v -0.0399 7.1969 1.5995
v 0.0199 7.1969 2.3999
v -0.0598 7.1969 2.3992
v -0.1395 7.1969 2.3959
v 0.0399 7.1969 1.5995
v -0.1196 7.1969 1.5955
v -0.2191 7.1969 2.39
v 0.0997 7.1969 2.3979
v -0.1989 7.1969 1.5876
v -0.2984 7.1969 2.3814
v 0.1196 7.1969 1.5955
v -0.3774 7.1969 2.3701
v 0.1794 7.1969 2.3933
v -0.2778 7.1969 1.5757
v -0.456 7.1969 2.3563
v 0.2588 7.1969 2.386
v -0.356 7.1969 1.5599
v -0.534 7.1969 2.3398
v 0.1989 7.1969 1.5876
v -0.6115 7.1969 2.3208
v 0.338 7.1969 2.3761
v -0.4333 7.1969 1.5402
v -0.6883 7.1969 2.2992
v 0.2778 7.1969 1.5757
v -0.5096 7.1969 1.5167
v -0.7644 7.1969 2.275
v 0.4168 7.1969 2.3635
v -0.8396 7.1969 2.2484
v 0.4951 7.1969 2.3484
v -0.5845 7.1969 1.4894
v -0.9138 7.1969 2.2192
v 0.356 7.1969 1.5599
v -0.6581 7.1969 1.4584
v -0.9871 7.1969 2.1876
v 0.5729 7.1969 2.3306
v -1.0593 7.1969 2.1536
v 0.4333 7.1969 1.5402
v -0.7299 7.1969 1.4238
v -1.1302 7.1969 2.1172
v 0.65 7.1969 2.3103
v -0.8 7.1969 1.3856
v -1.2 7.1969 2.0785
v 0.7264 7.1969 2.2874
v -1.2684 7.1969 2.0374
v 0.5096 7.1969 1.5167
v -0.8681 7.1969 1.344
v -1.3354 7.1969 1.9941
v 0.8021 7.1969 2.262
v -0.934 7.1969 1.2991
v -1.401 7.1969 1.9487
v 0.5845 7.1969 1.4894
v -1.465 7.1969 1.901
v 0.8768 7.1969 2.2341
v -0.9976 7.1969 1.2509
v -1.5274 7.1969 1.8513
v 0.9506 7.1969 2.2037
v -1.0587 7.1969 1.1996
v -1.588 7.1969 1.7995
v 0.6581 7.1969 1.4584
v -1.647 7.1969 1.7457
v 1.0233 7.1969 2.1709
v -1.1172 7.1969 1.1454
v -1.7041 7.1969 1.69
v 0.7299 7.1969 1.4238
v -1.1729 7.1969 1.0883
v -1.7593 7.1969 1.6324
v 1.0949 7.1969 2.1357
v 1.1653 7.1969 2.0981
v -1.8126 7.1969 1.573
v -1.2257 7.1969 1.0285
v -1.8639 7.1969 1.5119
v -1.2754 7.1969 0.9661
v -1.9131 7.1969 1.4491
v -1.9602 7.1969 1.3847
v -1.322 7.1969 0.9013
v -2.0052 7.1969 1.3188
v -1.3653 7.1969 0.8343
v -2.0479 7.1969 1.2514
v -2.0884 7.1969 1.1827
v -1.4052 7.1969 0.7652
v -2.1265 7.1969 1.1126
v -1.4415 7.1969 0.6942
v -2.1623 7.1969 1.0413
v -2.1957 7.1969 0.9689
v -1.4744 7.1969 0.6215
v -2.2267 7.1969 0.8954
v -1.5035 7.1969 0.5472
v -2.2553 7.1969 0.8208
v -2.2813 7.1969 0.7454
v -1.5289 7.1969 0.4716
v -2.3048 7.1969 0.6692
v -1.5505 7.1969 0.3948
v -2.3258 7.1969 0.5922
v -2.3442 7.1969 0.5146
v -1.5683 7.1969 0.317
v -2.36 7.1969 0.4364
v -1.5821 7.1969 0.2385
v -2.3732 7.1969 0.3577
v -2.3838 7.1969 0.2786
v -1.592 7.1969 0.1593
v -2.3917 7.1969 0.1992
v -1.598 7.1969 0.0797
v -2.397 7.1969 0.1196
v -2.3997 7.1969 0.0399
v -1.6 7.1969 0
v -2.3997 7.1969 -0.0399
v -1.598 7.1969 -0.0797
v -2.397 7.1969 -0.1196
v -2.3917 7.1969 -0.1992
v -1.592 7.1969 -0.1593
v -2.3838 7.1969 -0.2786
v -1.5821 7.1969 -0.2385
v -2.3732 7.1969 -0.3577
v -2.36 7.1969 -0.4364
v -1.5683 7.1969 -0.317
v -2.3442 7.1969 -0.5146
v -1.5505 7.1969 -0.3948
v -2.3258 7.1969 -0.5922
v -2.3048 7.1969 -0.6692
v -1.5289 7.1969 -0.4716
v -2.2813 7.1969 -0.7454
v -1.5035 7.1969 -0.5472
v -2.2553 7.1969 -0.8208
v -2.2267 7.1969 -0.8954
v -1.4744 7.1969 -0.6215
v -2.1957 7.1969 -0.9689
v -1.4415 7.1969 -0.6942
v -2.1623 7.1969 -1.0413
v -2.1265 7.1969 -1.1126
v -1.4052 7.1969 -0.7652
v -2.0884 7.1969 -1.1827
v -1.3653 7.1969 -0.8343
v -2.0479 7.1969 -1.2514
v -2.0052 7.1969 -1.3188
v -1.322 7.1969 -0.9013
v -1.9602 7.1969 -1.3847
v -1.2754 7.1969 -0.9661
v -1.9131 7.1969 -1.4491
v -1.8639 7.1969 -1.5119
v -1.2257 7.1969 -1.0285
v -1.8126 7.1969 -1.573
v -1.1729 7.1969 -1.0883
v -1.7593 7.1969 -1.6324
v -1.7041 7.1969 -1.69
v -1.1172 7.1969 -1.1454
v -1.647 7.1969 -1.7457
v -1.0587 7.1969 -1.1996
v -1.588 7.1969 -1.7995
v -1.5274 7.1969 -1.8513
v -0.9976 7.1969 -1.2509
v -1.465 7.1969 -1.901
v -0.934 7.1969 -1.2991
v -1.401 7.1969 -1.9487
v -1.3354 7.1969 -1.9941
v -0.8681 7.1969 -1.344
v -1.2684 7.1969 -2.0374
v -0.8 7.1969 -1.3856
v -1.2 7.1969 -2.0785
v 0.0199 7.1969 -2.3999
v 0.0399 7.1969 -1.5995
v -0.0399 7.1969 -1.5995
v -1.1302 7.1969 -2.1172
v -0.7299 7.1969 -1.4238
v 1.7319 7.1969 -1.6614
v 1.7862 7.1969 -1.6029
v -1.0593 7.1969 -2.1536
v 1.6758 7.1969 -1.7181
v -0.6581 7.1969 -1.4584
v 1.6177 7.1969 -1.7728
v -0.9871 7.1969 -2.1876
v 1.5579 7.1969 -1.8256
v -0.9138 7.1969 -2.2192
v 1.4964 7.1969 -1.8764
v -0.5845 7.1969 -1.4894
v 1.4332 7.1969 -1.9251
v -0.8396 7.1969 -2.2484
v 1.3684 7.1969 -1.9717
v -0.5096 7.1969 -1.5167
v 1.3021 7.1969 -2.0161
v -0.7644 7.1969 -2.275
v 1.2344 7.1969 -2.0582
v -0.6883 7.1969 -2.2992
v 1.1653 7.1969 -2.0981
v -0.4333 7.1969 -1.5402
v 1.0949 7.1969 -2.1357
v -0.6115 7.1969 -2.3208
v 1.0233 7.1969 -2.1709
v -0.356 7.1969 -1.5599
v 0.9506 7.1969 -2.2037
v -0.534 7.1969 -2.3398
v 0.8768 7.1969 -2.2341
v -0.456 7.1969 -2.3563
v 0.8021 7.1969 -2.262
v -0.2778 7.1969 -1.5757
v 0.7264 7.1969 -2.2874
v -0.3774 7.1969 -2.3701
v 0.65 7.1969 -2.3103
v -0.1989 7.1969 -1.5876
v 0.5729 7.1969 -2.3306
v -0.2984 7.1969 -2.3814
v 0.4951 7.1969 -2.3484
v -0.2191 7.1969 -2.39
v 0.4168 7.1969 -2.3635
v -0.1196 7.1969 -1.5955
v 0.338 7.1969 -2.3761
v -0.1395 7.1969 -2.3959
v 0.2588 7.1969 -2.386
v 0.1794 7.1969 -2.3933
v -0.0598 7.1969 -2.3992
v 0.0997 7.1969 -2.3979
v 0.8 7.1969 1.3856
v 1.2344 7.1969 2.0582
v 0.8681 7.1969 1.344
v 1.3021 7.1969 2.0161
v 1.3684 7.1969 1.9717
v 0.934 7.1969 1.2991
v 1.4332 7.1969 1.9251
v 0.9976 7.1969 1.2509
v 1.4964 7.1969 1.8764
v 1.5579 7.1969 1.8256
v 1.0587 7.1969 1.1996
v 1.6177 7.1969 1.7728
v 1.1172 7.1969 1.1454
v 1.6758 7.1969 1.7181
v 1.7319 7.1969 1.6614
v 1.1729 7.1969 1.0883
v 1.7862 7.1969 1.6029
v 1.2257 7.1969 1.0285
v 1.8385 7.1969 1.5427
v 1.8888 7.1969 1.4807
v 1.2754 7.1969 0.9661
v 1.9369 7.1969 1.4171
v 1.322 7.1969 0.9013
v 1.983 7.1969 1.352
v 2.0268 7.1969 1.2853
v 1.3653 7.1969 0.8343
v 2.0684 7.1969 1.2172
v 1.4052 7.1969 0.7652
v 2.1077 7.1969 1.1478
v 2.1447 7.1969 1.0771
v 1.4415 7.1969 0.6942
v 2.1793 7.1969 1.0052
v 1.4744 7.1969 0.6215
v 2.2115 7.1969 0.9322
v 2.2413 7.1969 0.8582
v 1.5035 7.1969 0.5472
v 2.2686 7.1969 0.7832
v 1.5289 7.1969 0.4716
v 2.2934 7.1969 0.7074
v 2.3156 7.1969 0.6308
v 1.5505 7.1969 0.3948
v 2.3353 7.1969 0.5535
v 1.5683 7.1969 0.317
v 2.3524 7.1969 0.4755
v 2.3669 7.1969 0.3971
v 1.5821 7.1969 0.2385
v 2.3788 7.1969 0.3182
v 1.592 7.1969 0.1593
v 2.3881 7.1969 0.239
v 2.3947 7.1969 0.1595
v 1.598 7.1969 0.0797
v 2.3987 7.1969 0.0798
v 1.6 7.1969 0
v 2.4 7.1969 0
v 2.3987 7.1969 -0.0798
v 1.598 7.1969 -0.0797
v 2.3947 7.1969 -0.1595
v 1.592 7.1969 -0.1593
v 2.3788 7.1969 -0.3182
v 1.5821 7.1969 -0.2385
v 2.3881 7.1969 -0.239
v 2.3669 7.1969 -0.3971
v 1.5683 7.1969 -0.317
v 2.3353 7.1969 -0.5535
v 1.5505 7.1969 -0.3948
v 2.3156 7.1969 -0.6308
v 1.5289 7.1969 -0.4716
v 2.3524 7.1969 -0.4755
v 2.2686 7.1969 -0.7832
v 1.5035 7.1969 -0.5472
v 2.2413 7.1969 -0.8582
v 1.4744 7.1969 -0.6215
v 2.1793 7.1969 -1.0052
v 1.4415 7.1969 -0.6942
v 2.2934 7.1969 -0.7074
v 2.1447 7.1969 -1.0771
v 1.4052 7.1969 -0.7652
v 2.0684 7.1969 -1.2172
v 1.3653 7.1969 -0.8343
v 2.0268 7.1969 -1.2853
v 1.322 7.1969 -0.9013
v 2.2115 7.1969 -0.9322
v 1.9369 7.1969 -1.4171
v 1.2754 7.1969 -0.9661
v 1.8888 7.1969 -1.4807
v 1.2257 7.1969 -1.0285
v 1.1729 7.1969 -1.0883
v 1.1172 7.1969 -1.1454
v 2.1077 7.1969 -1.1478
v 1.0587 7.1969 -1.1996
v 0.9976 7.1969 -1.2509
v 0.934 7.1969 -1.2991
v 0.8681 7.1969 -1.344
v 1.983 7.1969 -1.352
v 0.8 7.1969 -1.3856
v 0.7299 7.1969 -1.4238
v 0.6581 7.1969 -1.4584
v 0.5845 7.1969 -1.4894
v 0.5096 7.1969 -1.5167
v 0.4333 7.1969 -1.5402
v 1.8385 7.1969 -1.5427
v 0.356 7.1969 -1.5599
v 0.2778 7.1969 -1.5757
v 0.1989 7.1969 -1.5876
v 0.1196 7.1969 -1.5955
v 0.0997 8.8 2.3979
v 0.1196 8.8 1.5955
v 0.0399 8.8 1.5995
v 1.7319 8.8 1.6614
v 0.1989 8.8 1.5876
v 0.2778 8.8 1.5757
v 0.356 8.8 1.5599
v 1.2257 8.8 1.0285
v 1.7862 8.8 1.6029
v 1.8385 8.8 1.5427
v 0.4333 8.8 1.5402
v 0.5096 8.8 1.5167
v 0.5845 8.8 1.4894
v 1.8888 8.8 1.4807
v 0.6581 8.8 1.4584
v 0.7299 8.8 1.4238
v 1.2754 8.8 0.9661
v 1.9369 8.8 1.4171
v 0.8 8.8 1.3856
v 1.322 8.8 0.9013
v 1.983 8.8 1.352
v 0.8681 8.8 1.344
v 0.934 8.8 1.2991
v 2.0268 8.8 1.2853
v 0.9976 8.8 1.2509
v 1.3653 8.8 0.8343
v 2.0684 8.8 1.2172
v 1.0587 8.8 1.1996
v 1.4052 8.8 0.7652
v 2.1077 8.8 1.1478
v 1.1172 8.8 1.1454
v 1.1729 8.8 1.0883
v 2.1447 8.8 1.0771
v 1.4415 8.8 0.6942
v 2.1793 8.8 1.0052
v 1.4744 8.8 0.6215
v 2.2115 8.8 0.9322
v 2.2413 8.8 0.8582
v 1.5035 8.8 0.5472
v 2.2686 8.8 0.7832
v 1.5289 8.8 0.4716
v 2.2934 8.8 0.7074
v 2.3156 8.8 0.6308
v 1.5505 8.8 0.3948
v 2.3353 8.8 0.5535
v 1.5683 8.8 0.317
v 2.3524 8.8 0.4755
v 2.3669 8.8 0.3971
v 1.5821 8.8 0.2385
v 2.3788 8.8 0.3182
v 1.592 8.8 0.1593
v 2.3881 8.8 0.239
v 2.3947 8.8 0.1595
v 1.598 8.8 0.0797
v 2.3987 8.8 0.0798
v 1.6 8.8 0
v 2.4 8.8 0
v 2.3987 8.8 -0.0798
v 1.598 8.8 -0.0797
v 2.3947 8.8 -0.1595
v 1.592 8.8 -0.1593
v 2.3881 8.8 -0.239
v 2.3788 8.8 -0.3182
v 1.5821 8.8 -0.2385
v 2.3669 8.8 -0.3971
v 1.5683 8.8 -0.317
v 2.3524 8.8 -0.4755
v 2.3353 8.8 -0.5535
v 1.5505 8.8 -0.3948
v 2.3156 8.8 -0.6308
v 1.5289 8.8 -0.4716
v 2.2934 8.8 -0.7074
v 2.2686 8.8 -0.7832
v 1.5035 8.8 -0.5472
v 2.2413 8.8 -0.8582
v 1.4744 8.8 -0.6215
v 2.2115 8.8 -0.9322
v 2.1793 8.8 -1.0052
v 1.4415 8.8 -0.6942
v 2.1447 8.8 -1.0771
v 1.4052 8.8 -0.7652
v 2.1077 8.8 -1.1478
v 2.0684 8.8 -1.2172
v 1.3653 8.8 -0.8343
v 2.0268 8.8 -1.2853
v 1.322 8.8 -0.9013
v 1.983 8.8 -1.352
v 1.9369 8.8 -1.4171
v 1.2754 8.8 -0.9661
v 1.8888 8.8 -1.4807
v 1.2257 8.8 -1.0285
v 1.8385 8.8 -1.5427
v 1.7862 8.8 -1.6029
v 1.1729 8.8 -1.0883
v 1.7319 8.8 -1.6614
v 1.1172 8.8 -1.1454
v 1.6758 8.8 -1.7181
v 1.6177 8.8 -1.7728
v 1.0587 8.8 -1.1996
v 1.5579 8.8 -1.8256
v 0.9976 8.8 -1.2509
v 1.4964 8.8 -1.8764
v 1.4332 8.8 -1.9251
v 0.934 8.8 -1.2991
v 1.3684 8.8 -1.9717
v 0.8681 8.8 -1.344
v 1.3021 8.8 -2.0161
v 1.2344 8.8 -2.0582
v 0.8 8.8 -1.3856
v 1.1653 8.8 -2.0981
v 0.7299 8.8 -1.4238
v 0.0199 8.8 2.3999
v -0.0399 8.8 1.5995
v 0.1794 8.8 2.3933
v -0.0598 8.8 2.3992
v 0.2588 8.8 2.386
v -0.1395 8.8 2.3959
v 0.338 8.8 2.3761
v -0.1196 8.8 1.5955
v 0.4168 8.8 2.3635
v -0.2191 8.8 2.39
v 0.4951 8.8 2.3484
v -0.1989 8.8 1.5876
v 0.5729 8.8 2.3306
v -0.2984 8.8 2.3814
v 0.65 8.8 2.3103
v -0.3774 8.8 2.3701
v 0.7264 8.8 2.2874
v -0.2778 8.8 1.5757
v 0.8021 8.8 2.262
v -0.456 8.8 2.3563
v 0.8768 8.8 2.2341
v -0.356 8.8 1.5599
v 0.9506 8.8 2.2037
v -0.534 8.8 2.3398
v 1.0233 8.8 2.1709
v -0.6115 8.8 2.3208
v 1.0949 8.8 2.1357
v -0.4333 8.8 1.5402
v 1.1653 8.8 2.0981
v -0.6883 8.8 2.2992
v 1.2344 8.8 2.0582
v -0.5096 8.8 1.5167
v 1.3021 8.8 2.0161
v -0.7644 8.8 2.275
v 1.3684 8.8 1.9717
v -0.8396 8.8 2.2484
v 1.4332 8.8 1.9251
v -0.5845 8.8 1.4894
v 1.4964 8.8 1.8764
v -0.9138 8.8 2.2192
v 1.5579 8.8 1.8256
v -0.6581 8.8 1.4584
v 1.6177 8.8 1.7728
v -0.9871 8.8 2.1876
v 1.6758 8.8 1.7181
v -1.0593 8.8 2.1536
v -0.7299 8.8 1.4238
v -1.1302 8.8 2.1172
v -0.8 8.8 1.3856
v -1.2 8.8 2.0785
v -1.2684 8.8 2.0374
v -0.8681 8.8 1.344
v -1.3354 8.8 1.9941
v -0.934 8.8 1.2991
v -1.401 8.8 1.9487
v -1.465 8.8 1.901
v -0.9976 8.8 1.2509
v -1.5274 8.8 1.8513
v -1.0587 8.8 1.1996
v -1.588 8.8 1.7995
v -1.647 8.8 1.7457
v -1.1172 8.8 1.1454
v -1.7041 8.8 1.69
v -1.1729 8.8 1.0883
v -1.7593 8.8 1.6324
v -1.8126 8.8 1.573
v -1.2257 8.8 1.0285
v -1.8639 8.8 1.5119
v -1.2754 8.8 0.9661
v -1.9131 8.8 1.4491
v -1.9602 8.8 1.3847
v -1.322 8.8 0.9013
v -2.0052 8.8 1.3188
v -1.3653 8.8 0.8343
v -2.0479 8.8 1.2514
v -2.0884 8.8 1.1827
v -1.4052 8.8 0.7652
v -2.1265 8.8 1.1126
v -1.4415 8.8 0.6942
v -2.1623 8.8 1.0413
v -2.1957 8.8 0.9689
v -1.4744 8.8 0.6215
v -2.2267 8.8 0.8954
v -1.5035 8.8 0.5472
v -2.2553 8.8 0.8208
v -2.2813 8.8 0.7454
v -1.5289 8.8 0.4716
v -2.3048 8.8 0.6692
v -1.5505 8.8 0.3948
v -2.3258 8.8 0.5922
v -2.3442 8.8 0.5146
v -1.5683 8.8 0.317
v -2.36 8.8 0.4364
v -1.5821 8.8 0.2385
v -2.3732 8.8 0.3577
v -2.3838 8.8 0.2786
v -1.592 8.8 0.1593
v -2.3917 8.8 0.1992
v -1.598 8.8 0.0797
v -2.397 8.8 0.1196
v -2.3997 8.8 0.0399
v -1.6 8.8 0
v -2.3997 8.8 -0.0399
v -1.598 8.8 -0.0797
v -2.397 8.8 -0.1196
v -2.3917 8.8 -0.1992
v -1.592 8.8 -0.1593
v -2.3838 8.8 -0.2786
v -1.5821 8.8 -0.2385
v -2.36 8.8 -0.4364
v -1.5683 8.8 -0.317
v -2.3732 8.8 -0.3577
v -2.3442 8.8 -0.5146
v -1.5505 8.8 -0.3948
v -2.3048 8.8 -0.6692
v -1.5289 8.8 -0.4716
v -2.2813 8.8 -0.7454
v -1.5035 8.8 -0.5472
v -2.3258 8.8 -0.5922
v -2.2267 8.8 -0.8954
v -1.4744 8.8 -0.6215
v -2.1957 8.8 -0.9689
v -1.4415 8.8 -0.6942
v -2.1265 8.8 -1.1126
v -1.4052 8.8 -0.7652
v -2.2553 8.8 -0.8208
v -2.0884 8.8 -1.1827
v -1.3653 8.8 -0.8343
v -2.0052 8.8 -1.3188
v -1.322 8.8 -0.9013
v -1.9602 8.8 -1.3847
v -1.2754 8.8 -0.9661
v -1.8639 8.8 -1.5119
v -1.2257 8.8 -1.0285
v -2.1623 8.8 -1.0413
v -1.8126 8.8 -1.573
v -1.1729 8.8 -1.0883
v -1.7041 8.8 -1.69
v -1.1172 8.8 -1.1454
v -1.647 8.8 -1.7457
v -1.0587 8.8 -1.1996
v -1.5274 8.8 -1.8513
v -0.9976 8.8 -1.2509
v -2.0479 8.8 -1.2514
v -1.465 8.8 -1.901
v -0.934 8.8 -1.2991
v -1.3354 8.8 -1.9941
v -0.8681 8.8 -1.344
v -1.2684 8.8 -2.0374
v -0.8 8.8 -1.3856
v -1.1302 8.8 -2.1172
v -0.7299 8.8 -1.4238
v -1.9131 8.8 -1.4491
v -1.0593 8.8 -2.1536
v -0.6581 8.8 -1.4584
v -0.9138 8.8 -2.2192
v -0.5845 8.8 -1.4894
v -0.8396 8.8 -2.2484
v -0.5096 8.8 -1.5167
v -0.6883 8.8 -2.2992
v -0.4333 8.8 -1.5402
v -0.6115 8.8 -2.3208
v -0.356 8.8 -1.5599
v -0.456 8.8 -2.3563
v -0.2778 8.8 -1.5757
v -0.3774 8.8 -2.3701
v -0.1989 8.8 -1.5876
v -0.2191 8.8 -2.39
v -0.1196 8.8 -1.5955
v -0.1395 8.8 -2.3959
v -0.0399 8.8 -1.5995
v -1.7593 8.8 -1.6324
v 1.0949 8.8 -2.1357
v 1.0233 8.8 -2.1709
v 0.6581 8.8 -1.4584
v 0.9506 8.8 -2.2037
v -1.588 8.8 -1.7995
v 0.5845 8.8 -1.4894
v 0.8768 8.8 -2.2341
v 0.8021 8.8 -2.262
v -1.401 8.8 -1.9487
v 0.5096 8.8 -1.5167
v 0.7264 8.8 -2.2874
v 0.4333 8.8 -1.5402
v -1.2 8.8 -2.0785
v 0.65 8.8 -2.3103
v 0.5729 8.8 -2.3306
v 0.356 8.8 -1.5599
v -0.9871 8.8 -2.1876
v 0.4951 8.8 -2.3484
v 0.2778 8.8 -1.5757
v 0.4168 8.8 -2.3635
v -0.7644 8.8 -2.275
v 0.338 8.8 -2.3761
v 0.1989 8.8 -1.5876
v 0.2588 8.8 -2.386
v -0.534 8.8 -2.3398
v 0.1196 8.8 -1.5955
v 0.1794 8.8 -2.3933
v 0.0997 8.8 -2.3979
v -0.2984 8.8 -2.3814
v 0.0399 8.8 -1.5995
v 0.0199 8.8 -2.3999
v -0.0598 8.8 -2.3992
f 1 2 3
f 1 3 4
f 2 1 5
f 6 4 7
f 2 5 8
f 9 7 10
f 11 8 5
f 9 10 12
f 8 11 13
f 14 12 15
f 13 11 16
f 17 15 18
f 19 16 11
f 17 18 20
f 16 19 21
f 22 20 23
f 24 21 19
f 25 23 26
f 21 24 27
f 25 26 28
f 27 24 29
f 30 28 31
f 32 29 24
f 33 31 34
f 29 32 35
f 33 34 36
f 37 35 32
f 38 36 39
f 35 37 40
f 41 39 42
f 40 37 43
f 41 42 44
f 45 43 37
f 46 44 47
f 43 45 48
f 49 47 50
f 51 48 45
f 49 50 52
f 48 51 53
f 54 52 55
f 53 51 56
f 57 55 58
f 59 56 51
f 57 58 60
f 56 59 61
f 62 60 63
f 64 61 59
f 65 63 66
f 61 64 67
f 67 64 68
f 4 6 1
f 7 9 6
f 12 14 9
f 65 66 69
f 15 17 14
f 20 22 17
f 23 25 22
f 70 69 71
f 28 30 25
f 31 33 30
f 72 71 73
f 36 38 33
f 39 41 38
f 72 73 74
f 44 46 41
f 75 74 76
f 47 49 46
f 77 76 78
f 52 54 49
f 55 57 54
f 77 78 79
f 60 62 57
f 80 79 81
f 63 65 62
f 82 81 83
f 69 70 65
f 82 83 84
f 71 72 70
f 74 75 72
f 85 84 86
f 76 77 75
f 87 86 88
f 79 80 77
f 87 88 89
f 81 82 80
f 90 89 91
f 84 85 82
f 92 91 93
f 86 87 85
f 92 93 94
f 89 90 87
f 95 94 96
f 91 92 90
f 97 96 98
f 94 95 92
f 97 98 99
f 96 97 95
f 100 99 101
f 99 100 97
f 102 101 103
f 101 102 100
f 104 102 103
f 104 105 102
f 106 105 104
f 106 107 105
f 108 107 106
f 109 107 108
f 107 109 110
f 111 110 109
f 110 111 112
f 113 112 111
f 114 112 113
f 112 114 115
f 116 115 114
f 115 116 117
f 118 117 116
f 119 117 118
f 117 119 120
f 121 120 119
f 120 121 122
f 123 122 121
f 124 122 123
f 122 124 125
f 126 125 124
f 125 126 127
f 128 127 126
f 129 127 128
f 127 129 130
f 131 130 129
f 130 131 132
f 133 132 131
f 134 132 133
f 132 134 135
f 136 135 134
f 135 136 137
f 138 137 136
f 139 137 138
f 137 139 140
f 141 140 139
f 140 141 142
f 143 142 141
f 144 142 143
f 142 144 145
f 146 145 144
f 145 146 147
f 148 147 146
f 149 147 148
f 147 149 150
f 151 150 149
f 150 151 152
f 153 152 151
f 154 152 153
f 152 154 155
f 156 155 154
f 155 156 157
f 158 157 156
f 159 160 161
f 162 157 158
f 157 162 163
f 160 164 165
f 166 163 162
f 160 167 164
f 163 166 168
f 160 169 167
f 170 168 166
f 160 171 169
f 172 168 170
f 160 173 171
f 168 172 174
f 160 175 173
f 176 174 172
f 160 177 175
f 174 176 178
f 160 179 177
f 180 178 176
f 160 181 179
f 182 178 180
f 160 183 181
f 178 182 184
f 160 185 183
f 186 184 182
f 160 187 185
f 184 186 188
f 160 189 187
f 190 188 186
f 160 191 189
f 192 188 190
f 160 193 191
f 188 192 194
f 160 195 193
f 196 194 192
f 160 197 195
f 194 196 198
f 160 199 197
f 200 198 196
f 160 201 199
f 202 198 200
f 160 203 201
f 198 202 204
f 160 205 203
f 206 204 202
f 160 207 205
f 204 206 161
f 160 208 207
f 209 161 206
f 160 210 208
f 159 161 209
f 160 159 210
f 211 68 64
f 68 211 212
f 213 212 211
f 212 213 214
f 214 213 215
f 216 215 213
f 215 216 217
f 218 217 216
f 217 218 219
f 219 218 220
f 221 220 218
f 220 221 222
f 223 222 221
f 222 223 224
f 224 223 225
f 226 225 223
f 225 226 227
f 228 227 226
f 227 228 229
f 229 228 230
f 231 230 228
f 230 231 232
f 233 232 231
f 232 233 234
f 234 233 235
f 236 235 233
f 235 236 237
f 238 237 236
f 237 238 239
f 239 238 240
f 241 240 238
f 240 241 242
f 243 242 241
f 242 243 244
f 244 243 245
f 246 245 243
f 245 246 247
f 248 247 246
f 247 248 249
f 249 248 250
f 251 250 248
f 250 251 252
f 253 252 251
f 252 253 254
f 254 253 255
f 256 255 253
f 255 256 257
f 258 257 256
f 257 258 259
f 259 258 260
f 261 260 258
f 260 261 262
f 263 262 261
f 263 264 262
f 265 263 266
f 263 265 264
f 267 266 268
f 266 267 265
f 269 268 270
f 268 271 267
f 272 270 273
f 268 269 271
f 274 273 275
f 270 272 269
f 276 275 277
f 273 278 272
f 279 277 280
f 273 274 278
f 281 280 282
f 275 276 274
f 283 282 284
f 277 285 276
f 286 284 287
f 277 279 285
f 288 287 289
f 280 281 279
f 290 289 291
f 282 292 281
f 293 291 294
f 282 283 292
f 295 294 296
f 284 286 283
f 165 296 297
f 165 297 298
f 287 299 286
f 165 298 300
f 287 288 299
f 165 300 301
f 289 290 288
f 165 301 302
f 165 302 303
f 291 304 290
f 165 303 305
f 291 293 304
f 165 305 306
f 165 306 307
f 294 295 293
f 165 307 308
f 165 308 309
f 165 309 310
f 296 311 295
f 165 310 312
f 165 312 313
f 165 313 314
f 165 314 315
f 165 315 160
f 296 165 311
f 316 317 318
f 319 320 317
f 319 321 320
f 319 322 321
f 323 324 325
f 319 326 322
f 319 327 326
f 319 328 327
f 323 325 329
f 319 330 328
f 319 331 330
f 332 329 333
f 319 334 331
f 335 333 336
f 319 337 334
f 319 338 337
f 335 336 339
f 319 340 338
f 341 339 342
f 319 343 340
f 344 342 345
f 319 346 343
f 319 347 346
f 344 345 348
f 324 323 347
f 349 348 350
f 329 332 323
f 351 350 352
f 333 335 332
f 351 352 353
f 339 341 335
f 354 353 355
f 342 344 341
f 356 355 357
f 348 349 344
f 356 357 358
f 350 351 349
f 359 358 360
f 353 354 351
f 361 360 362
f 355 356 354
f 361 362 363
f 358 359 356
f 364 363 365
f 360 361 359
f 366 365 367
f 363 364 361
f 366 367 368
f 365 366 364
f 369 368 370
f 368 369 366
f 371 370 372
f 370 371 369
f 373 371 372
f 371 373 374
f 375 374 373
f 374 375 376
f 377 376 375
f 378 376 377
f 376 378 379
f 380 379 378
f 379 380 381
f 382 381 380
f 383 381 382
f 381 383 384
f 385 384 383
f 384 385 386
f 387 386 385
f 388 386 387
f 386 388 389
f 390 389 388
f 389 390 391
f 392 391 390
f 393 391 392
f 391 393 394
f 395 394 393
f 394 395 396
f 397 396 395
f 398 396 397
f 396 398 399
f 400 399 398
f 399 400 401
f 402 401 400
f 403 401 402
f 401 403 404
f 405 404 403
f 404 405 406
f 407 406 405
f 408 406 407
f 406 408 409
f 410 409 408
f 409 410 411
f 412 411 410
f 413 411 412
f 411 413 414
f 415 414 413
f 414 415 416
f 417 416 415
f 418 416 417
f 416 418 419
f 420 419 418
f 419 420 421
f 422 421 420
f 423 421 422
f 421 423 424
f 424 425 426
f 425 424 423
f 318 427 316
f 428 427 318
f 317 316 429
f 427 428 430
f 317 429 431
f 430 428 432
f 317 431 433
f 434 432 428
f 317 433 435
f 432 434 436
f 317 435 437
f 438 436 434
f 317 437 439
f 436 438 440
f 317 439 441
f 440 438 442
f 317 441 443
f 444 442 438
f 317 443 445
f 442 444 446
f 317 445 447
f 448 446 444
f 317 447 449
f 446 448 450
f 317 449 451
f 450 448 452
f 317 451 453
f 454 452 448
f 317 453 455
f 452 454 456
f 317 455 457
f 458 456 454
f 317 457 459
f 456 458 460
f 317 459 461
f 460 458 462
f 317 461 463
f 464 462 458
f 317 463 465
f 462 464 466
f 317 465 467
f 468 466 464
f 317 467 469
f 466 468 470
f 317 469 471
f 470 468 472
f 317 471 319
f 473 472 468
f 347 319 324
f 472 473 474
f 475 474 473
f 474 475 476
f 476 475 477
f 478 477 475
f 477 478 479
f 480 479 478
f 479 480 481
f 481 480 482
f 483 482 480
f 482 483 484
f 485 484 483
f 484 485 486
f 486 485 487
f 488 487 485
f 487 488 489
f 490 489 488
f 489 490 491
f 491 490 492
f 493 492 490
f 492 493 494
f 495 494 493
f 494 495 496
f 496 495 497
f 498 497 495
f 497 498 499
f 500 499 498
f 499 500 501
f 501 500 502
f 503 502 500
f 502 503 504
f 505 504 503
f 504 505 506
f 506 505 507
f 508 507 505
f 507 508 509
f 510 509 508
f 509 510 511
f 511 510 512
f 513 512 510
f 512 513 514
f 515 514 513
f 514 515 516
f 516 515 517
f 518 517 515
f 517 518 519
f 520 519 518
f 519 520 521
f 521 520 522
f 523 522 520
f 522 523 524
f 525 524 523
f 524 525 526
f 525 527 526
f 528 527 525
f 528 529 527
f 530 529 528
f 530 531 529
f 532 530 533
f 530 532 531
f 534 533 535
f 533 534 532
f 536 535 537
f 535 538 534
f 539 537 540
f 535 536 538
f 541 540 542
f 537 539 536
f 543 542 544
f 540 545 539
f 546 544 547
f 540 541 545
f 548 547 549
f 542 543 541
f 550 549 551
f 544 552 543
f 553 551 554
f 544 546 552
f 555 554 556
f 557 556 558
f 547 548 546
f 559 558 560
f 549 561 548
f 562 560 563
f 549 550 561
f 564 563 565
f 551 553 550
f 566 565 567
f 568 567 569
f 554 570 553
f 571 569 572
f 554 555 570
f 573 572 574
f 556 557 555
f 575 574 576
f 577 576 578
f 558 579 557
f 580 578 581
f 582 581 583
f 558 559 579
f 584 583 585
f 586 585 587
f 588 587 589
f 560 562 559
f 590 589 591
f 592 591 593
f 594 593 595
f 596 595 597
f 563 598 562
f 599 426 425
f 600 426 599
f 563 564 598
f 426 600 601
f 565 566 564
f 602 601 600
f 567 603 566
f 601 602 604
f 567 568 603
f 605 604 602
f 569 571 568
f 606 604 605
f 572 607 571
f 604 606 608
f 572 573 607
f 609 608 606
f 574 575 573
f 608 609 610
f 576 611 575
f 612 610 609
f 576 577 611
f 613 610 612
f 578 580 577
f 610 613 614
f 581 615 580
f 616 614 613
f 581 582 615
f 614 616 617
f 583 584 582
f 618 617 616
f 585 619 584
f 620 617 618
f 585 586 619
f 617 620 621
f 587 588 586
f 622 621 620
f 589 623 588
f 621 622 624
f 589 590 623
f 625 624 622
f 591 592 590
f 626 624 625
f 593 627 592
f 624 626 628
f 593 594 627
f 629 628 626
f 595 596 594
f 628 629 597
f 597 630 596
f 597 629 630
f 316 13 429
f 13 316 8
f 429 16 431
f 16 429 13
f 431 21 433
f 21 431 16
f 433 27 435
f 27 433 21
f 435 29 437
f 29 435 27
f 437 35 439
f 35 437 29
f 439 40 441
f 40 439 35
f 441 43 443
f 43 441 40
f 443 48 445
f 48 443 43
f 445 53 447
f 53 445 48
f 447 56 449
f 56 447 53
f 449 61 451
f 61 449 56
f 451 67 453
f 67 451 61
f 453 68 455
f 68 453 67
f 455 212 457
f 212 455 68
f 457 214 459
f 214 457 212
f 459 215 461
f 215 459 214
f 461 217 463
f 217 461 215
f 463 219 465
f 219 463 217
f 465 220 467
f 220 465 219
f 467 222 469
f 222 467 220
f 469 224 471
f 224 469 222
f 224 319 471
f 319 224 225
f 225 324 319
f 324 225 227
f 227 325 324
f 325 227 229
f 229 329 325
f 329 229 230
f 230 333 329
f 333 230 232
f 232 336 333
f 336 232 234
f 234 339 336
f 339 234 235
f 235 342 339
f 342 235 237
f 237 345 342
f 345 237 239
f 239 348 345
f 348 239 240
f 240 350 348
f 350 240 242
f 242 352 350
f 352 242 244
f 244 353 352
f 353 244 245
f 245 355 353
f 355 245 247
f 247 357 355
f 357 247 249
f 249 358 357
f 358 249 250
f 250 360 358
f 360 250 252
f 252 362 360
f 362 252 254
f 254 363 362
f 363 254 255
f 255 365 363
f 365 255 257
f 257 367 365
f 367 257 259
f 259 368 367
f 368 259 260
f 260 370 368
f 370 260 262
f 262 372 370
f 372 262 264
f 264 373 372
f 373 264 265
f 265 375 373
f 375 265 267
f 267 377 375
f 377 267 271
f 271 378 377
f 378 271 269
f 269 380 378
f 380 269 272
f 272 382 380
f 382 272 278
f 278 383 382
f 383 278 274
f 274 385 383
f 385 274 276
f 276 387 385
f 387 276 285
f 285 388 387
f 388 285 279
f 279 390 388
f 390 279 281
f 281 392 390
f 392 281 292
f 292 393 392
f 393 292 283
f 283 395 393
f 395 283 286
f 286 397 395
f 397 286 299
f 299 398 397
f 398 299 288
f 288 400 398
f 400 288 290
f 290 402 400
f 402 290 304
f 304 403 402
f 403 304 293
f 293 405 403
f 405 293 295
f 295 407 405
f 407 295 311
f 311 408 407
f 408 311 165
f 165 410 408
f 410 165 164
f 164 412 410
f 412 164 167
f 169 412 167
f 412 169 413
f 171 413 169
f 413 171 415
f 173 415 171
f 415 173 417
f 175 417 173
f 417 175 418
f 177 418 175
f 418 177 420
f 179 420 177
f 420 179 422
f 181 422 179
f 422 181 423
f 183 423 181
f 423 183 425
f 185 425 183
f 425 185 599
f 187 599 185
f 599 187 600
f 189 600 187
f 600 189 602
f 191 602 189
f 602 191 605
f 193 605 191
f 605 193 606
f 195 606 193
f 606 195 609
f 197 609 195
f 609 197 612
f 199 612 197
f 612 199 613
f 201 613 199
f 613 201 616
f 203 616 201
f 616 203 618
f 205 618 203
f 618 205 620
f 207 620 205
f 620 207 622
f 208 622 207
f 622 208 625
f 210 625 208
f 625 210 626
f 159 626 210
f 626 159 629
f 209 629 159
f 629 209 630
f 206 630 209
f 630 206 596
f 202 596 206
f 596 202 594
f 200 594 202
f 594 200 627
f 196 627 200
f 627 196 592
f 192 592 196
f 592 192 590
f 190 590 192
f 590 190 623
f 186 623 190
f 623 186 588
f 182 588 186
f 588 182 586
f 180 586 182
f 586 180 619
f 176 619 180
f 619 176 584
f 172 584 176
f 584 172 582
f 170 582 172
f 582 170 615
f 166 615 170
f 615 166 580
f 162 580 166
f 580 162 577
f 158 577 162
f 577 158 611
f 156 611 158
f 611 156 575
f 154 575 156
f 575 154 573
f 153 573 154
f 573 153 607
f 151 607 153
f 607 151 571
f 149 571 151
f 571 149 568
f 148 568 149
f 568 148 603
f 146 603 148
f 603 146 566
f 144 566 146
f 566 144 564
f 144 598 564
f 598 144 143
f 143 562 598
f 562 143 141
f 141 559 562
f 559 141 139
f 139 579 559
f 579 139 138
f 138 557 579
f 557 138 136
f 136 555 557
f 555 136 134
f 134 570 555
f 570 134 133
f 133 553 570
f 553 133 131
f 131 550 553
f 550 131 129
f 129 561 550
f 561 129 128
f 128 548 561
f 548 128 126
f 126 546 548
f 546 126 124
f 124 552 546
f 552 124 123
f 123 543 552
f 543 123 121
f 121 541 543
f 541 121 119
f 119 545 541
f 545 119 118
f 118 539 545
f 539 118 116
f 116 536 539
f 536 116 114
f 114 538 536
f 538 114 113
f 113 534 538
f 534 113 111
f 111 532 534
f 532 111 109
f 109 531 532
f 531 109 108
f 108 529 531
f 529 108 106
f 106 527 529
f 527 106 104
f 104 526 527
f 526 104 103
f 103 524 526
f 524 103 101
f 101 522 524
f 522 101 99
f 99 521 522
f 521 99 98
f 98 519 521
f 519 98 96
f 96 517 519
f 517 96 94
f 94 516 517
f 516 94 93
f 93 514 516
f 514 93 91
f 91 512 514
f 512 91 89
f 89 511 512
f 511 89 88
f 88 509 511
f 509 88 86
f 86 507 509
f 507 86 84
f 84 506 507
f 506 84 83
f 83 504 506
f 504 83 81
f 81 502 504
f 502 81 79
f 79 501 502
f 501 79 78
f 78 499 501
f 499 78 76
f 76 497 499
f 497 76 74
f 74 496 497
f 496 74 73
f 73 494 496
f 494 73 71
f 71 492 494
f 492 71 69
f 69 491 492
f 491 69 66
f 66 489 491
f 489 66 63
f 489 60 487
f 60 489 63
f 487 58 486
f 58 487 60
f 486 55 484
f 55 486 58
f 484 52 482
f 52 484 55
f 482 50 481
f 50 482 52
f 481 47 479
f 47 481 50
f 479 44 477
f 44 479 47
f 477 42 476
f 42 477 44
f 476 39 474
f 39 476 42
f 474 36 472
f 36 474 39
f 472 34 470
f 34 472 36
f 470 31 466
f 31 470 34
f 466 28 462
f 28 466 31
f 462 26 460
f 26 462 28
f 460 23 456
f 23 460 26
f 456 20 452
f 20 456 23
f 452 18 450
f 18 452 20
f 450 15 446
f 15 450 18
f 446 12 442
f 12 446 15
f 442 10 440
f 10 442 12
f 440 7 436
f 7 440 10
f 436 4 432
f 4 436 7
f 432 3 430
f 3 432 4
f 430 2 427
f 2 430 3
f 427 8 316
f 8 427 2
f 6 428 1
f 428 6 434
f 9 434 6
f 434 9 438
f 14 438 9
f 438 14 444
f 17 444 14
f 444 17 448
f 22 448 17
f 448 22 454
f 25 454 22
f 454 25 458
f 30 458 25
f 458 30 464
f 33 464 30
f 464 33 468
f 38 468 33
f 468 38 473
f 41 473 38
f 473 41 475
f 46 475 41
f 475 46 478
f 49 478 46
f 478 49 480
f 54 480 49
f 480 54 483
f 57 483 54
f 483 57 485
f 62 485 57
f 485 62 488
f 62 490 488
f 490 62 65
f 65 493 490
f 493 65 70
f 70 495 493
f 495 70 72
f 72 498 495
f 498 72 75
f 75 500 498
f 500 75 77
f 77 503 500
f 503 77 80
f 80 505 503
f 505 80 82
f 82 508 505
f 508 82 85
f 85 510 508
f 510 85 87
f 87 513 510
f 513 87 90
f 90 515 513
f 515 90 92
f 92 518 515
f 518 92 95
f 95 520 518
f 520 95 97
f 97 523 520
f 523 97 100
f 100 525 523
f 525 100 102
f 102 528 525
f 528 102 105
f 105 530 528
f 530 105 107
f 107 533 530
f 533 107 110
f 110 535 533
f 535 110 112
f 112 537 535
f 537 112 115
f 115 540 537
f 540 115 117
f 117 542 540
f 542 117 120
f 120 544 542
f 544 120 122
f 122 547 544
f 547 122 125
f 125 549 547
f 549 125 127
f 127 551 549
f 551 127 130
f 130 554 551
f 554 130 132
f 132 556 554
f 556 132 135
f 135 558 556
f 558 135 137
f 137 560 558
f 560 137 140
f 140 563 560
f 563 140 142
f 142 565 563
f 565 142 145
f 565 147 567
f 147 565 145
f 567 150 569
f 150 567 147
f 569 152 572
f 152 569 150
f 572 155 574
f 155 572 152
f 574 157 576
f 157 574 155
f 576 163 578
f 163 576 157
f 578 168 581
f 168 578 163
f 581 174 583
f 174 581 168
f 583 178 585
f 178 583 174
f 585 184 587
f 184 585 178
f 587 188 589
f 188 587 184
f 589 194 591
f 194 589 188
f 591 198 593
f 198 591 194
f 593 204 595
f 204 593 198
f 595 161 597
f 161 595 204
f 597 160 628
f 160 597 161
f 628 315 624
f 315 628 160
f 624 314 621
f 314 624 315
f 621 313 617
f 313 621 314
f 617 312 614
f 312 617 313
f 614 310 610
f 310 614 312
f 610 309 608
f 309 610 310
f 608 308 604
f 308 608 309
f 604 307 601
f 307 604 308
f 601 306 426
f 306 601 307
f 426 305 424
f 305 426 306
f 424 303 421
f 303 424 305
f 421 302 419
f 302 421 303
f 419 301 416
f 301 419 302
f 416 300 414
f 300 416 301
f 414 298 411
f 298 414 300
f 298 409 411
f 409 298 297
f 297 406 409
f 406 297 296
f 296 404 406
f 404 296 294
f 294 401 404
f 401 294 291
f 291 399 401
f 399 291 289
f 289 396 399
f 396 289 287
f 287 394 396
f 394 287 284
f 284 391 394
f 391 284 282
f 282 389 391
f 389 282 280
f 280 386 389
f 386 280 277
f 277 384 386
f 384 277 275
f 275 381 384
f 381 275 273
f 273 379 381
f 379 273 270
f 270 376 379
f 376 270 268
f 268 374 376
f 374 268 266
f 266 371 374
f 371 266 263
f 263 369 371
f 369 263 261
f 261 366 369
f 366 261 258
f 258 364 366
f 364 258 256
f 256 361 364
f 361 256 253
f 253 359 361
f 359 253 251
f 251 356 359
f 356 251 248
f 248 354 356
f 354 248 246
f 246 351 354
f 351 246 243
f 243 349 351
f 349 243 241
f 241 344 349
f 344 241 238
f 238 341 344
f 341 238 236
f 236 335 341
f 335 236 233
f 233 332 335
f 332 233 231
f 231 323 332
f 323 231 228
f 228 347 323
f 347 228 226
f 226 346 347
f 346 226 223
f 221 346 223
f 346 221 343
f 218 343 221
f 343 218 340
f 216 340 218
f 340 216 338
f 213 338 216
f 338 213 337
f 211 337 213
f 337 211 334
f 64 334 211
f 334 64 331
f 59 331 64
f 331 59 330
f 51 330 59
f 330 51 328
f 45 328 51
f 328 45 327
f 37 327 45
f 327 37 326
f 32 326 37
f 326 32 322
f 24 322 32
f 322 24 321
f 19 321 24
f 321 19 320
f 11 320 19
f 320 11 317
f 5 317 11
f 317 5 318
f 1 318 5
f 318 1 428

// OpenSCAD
use <../lib.scad>
use <4349.scad>
$fa=1; $fs=0.2;
function ldraw_lib__231(realsolid=false) = [
// 0 ~Moved to 4349
// 0 Name: 231.dat
// 0 Author: [PTadmin]
// 0 !LDRAW_ORG Part UPDATE 1998-06
// 0 !LICENSE Licensed under CC BY 4.0 : see CAreadme.txt
// 
// 0 BFC CERTIFY CCW
  [0,"BFC","CERTIFY"],
  [0,"BFC","CCW"],
// 
// 0 !HISTORY 1998-06-20 [PTadmin] Official Update 1998-06
// 0 !HISTORY 2007-05-08 [PTadmin] Header formatted for Contributor Agreement
// 0 !HISTORY 2008-07-01 [PTadmin] Official Update 2008-01
// 
// 
// 1 16 0 0 0 1 0 0 0 1 0 0 0 1 4349.dat
  [1,16,0,0,0,1,0,0,0,1,0,0,0,1, ldraw_lib__4349(realsolid)],
];
module ldraw_lib__231(step=0, col=false, unit=2/5, alt=false, line=0.2, solid=!$preview)
    makepoly(ldraw_lib__231(solid), step=step, col=col, unit=unit, alt=alt, line=line, solid=solid);
ldraw_lib__231(line=0.2);
